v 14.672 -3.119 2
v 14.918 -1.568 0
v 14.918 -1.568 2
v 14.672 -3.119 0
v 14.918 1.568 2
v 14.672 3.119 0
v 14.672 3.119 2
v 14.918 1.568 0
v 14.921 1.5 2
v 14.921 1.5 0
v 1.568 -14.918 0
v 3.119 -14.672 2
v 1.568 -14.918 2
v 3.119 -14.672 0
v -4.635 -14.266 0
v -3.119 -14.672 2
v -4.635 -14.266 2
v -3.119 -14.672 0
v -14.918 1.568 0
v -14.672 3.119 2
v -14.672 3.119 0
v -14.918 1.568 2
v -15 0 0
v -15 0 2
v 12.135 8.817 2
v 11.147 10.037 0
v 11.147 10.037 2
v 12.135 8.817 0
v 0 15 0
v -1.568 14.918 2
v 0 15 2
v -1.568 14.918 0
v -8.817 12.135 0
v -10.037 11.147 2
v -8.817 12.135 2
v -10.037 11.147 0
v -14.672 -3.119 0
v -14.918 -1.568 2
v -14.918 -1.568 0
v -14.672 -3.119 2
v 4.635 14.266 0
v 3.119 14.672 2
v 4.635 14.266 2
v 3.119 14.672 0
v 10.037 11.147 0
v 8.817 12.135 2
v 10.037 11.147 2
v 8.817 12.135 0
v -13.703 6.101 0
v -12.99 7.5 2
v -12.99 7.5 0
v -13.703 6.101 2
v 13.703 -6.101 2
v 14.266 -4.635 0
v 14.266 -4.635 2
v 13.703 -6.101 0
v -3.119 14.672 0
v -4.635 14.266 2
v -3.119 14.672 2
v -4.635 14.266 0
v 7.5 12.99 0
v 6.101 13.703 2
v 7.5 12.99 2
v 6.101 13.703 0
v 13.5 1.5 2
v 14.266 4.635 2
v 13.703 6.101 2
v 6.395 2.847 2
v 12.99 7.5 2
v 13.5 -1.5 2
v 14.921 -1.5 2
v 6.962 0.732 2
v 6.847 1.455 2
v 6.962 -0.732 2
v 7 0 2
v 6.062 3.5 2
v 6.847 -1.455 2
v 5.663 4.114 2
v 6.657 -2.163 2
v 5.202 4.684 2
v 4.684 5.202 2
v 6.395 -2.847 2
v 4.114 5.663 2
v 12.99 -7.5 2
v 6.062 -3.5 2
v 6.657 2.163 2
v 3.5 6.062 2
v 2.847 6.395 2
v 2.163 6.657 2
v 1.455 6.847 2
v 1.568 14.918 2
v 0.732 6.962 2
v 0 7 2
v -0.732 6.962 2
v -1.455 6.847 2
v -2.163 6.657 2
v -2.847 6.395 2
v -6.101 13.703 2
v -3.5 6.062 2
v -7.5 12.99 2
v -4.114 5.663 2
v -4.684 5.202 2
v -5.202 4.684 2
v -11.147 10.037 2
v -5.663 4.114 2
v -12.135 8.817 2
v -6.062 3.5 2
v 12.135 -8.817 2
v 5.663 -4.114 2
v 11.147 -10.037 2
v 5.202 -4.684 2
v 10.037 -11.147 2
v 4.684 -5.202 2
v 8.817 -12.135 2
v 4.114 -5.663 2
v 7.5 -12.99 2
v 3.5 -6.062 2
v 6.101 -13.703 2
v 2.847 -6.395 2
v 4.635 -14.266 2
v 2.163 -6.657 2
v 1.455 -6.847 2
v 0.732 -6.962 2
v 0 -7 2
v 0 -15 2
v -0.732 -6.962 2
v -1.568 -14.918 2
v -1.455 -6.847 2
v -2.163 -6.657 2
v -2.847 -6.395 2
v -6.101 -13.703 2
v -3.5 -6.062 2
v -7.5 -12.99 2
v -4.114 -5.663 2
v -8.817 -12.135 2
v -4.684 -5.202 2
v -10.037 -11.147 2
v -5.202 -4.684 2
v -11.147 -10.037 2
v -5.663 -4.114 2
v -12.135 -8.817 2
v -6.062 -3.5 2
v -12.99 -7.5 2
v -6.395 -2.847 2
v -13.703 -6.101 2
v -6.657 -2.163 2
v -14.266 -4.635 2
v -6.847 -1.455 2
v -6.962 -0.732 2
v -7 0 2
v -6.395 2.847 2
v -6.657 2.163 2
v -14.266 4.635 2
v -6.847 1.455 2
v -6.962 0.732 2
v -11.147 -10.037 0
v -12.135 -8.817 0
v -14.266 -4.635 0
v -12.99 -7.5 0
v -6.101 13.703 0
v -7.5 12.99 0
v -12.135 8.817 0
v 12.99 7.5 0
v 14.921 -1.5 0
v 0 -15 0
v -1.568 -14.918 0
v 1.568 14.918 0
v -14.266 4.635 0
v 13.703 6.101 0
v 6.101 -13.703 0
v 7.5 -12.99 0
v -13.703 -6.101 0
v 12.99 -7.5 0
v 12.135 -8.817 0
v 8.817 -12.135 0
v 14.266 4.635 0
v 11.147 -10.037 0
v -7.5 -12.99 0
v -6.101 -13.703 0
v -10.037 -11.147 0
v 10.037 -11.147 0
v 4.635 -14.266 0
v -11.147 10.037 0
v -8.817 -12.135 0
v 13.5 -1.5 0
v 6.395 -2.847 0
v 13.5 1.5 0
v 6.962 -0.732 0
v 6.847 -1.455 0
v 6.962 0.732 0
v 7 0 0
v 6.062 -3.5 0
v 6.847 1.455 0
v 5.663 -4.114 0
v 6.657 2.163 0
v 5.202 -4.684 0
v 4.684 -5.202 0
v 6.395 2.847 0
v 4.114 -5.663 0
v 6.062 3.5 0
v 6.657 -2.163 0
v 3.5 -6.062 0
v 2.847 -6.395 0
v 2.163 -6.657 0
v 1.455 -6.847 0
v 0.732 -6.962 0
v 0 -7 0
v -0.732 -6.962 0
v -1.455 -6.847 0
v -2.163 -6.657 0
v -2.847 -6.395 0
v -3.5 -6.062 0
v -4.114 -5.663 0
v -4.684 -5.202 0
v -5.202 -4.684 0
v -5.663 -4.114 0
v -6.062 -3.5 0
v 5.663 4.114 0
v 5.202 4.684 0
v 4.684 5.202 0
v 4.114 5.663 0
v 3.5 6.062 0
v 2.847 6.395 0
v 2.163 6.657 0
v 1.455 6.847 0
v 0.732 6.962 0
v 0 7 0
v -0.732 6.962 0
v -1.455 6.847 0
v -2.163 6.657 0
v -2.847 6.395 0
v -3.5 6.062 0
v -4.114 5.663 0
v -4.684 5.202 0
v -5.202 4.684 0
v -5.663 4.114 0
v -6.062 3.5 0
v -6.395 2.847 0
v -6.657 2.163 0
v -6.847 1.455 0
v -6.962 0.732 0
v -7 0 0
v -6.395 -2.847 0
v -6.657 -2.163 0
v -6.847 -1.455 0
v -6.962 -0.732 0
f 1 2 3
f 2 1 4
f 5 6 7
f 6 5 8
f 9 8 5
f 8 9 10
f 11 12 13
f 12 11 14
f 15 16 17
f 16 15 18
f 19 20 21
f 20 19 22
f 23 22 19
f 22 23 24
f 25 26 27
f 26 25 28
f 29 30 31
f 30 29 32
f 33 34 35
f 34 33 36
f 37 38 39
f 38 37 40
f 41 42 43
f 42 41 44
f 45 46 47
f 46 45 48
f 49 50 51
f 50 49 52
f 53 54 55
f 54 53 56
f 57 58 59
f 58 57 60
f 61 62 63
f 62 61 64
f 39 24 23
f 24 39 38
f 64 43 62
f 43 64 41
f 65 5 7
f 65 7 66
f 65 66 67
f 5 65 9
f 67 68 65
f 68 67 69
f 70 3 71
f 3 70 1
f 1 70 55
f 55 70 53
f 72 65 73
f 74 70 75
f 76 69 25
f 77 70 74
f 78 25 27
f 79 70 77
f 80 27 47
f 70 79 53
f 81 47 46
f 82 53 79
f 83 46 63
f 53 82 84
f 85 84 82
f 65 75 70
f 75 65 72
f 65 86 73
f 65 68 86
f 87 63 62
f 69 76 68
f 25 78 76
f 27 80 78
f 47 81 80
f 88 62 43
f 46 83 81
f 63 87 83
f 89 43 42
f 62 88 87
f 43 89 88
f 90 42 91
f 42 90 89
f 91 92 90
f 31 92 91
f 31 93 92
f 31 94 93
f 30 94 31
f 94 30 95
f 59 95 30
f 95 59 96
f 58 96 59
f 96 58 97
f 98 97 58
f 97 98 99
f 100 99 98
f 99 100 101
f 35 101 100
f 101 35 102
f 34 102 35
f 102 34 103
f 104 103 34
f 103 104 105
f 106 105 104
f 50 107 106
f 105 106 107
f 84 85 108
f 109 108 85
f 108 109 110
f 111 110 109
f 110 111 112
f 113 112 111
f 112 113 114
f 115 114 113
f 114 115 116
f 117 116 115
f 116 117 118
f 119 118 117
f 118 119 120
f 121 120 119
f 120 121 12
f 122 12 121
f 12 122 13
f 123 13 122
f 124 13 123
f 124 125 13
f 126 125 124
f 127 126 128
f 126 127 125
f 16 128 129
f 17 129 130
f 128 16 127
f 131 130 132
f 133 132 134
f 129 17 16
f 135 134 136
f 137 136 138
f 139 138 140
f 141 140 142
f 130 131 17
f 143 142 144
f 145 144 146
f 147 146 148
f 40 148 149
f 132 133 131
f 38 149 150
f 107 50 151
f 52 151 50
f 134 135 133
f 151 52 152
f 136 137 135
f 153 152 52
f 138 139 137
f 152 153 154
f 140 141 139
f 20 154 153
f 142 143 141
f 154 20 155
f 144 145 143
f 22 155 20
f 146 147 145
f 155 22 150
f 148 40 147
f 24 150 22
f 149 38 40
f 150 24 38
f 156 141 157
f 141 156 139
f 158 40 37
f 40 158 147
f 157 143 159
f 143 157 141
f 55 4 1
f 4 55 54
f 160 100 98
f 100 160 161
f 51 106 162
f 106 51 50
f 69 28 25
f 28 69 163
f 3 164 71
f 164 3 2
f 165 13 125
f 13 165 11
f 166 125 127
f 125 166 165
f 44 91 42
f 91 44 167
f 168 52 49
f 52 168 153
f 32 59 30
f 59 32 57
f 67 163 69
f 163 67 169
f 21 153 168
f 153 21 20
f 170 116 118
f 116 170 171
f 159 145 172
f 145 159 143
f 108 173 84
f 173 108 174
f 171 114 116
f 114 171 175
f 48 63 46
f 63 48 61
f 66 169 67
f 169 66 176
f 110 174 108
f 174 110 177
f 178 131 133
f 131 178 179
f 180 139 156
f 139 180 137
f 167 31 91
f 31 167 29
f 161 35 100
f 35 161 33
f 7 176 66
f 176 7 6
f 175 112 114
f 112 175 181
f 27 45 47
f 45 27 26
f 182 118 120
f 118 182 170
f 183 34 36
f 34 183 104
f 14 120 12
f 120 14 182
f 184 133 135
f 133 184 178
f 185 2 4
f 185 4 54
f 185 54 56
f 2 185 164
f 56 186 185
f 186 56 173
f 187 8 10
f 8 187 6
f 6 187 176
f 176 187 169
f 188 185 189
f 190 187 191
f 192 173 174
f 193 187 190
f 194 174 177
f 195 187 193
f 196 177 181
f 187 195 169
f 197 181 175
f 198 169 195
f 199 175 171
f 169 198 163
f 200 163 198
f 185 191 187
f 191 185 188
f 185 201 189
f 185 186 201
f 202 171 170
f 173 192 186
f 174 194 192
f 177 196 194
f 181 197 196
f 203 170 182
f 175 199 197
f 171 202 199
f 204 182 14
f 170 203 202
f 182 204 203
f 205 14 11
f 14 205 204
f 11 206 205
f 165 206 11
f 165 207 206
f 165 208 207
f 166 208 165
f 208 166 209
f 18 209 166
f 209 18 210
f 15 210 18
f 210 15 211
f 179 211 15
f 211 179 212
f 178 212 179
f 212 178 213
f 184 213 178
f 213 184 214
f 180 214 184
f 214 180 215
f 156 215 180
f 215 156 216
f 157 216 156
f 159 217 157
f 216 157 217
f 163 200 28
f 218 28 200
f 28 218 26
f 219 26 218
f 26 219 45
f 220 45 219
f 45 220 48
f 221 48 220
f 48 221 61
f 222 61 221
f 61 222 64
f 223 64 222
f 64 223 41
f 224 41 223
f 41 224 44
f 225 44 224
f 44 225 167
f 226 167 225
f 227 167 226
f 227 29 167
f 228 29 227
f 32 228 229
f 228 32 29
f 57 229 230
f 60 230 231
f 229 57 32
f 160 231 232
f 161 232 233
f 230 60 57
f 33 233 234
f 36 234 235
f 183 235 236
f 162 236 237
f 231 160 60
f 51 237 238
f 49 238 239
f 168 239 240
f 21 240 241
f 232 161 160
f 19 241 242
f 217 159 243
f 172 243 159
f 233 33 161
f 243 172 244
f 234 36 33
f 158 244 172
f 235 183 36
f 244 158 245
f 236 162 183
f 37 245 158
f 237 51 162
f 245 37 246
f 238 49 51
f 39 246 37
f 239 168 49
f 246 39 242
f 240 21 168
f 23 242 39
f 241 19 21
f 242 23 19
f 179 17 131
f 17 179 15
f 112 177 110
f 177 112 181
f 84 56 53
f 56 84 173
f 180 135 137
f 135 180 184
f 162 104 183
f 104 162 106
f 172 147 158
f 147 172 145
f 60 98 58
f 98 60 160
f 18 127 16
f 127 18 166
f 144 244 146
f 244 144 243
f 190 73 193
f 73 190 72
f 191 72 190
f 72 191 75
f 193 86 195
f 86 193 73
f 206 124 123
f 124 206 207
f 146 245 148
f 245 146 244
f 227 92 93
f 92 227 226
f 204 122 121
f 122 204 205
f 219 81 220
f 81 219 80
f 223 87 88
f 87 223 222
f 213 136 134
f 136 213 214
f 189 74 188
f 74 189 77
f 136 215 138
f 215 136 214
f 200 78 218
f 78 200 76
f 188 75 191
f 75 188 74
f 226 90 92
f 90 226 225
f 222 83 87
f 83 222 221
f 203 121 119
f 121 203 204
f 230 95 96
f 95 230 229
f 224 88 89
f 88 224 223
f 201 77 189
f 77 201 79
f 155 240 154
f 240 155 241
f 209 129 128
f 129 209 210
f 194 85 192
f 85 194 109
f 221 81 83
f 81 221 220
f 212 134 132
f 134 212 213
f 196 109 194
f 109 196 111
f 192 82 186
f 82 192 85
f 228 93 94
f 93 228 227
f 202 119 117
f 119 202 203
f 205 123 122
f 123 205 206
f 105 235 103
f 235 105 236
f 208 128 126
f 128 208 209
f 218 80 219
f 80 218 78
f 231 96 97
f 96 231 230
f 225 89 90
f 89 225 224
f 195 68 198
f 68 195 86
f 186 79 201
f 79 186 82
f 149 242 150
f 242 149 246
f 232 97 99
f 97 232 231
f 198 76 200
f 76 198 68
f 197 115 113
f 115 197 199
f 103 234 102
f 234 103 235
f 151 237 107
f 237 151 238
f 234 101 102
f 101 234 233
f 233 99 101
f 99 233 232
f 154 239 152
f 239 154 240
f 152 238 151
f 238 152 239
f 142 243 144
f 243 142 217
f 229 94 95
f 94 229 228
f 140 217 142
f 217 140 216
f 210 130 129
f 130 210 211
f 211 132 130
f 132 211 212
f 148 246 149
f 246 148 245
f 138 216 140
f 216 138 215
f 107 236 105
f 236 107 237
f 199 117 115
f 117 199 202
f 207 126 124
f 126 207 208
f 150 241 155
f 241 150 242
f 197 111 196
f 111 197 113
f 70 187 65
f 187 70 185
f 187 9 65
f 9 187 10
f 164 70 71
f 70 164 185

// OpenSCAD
// External retaining ring with installation gap.
$fn = 60;
eps = 0.02;
shaft_d = 14;
outer_d = 30;
thickness = 2;
gap = 3;
difference() {
    cylinder(d = outer_d, h = thickness);
    translate([0, 0, -eps]) cylinder(d = shaft_d, h = thickness + 2 * eps);
    translate([outer_d / 2 - gap / 2, -gap / 2, -eps]) cube([gap + eps, gap, thickness + 2 * eps]);
}
